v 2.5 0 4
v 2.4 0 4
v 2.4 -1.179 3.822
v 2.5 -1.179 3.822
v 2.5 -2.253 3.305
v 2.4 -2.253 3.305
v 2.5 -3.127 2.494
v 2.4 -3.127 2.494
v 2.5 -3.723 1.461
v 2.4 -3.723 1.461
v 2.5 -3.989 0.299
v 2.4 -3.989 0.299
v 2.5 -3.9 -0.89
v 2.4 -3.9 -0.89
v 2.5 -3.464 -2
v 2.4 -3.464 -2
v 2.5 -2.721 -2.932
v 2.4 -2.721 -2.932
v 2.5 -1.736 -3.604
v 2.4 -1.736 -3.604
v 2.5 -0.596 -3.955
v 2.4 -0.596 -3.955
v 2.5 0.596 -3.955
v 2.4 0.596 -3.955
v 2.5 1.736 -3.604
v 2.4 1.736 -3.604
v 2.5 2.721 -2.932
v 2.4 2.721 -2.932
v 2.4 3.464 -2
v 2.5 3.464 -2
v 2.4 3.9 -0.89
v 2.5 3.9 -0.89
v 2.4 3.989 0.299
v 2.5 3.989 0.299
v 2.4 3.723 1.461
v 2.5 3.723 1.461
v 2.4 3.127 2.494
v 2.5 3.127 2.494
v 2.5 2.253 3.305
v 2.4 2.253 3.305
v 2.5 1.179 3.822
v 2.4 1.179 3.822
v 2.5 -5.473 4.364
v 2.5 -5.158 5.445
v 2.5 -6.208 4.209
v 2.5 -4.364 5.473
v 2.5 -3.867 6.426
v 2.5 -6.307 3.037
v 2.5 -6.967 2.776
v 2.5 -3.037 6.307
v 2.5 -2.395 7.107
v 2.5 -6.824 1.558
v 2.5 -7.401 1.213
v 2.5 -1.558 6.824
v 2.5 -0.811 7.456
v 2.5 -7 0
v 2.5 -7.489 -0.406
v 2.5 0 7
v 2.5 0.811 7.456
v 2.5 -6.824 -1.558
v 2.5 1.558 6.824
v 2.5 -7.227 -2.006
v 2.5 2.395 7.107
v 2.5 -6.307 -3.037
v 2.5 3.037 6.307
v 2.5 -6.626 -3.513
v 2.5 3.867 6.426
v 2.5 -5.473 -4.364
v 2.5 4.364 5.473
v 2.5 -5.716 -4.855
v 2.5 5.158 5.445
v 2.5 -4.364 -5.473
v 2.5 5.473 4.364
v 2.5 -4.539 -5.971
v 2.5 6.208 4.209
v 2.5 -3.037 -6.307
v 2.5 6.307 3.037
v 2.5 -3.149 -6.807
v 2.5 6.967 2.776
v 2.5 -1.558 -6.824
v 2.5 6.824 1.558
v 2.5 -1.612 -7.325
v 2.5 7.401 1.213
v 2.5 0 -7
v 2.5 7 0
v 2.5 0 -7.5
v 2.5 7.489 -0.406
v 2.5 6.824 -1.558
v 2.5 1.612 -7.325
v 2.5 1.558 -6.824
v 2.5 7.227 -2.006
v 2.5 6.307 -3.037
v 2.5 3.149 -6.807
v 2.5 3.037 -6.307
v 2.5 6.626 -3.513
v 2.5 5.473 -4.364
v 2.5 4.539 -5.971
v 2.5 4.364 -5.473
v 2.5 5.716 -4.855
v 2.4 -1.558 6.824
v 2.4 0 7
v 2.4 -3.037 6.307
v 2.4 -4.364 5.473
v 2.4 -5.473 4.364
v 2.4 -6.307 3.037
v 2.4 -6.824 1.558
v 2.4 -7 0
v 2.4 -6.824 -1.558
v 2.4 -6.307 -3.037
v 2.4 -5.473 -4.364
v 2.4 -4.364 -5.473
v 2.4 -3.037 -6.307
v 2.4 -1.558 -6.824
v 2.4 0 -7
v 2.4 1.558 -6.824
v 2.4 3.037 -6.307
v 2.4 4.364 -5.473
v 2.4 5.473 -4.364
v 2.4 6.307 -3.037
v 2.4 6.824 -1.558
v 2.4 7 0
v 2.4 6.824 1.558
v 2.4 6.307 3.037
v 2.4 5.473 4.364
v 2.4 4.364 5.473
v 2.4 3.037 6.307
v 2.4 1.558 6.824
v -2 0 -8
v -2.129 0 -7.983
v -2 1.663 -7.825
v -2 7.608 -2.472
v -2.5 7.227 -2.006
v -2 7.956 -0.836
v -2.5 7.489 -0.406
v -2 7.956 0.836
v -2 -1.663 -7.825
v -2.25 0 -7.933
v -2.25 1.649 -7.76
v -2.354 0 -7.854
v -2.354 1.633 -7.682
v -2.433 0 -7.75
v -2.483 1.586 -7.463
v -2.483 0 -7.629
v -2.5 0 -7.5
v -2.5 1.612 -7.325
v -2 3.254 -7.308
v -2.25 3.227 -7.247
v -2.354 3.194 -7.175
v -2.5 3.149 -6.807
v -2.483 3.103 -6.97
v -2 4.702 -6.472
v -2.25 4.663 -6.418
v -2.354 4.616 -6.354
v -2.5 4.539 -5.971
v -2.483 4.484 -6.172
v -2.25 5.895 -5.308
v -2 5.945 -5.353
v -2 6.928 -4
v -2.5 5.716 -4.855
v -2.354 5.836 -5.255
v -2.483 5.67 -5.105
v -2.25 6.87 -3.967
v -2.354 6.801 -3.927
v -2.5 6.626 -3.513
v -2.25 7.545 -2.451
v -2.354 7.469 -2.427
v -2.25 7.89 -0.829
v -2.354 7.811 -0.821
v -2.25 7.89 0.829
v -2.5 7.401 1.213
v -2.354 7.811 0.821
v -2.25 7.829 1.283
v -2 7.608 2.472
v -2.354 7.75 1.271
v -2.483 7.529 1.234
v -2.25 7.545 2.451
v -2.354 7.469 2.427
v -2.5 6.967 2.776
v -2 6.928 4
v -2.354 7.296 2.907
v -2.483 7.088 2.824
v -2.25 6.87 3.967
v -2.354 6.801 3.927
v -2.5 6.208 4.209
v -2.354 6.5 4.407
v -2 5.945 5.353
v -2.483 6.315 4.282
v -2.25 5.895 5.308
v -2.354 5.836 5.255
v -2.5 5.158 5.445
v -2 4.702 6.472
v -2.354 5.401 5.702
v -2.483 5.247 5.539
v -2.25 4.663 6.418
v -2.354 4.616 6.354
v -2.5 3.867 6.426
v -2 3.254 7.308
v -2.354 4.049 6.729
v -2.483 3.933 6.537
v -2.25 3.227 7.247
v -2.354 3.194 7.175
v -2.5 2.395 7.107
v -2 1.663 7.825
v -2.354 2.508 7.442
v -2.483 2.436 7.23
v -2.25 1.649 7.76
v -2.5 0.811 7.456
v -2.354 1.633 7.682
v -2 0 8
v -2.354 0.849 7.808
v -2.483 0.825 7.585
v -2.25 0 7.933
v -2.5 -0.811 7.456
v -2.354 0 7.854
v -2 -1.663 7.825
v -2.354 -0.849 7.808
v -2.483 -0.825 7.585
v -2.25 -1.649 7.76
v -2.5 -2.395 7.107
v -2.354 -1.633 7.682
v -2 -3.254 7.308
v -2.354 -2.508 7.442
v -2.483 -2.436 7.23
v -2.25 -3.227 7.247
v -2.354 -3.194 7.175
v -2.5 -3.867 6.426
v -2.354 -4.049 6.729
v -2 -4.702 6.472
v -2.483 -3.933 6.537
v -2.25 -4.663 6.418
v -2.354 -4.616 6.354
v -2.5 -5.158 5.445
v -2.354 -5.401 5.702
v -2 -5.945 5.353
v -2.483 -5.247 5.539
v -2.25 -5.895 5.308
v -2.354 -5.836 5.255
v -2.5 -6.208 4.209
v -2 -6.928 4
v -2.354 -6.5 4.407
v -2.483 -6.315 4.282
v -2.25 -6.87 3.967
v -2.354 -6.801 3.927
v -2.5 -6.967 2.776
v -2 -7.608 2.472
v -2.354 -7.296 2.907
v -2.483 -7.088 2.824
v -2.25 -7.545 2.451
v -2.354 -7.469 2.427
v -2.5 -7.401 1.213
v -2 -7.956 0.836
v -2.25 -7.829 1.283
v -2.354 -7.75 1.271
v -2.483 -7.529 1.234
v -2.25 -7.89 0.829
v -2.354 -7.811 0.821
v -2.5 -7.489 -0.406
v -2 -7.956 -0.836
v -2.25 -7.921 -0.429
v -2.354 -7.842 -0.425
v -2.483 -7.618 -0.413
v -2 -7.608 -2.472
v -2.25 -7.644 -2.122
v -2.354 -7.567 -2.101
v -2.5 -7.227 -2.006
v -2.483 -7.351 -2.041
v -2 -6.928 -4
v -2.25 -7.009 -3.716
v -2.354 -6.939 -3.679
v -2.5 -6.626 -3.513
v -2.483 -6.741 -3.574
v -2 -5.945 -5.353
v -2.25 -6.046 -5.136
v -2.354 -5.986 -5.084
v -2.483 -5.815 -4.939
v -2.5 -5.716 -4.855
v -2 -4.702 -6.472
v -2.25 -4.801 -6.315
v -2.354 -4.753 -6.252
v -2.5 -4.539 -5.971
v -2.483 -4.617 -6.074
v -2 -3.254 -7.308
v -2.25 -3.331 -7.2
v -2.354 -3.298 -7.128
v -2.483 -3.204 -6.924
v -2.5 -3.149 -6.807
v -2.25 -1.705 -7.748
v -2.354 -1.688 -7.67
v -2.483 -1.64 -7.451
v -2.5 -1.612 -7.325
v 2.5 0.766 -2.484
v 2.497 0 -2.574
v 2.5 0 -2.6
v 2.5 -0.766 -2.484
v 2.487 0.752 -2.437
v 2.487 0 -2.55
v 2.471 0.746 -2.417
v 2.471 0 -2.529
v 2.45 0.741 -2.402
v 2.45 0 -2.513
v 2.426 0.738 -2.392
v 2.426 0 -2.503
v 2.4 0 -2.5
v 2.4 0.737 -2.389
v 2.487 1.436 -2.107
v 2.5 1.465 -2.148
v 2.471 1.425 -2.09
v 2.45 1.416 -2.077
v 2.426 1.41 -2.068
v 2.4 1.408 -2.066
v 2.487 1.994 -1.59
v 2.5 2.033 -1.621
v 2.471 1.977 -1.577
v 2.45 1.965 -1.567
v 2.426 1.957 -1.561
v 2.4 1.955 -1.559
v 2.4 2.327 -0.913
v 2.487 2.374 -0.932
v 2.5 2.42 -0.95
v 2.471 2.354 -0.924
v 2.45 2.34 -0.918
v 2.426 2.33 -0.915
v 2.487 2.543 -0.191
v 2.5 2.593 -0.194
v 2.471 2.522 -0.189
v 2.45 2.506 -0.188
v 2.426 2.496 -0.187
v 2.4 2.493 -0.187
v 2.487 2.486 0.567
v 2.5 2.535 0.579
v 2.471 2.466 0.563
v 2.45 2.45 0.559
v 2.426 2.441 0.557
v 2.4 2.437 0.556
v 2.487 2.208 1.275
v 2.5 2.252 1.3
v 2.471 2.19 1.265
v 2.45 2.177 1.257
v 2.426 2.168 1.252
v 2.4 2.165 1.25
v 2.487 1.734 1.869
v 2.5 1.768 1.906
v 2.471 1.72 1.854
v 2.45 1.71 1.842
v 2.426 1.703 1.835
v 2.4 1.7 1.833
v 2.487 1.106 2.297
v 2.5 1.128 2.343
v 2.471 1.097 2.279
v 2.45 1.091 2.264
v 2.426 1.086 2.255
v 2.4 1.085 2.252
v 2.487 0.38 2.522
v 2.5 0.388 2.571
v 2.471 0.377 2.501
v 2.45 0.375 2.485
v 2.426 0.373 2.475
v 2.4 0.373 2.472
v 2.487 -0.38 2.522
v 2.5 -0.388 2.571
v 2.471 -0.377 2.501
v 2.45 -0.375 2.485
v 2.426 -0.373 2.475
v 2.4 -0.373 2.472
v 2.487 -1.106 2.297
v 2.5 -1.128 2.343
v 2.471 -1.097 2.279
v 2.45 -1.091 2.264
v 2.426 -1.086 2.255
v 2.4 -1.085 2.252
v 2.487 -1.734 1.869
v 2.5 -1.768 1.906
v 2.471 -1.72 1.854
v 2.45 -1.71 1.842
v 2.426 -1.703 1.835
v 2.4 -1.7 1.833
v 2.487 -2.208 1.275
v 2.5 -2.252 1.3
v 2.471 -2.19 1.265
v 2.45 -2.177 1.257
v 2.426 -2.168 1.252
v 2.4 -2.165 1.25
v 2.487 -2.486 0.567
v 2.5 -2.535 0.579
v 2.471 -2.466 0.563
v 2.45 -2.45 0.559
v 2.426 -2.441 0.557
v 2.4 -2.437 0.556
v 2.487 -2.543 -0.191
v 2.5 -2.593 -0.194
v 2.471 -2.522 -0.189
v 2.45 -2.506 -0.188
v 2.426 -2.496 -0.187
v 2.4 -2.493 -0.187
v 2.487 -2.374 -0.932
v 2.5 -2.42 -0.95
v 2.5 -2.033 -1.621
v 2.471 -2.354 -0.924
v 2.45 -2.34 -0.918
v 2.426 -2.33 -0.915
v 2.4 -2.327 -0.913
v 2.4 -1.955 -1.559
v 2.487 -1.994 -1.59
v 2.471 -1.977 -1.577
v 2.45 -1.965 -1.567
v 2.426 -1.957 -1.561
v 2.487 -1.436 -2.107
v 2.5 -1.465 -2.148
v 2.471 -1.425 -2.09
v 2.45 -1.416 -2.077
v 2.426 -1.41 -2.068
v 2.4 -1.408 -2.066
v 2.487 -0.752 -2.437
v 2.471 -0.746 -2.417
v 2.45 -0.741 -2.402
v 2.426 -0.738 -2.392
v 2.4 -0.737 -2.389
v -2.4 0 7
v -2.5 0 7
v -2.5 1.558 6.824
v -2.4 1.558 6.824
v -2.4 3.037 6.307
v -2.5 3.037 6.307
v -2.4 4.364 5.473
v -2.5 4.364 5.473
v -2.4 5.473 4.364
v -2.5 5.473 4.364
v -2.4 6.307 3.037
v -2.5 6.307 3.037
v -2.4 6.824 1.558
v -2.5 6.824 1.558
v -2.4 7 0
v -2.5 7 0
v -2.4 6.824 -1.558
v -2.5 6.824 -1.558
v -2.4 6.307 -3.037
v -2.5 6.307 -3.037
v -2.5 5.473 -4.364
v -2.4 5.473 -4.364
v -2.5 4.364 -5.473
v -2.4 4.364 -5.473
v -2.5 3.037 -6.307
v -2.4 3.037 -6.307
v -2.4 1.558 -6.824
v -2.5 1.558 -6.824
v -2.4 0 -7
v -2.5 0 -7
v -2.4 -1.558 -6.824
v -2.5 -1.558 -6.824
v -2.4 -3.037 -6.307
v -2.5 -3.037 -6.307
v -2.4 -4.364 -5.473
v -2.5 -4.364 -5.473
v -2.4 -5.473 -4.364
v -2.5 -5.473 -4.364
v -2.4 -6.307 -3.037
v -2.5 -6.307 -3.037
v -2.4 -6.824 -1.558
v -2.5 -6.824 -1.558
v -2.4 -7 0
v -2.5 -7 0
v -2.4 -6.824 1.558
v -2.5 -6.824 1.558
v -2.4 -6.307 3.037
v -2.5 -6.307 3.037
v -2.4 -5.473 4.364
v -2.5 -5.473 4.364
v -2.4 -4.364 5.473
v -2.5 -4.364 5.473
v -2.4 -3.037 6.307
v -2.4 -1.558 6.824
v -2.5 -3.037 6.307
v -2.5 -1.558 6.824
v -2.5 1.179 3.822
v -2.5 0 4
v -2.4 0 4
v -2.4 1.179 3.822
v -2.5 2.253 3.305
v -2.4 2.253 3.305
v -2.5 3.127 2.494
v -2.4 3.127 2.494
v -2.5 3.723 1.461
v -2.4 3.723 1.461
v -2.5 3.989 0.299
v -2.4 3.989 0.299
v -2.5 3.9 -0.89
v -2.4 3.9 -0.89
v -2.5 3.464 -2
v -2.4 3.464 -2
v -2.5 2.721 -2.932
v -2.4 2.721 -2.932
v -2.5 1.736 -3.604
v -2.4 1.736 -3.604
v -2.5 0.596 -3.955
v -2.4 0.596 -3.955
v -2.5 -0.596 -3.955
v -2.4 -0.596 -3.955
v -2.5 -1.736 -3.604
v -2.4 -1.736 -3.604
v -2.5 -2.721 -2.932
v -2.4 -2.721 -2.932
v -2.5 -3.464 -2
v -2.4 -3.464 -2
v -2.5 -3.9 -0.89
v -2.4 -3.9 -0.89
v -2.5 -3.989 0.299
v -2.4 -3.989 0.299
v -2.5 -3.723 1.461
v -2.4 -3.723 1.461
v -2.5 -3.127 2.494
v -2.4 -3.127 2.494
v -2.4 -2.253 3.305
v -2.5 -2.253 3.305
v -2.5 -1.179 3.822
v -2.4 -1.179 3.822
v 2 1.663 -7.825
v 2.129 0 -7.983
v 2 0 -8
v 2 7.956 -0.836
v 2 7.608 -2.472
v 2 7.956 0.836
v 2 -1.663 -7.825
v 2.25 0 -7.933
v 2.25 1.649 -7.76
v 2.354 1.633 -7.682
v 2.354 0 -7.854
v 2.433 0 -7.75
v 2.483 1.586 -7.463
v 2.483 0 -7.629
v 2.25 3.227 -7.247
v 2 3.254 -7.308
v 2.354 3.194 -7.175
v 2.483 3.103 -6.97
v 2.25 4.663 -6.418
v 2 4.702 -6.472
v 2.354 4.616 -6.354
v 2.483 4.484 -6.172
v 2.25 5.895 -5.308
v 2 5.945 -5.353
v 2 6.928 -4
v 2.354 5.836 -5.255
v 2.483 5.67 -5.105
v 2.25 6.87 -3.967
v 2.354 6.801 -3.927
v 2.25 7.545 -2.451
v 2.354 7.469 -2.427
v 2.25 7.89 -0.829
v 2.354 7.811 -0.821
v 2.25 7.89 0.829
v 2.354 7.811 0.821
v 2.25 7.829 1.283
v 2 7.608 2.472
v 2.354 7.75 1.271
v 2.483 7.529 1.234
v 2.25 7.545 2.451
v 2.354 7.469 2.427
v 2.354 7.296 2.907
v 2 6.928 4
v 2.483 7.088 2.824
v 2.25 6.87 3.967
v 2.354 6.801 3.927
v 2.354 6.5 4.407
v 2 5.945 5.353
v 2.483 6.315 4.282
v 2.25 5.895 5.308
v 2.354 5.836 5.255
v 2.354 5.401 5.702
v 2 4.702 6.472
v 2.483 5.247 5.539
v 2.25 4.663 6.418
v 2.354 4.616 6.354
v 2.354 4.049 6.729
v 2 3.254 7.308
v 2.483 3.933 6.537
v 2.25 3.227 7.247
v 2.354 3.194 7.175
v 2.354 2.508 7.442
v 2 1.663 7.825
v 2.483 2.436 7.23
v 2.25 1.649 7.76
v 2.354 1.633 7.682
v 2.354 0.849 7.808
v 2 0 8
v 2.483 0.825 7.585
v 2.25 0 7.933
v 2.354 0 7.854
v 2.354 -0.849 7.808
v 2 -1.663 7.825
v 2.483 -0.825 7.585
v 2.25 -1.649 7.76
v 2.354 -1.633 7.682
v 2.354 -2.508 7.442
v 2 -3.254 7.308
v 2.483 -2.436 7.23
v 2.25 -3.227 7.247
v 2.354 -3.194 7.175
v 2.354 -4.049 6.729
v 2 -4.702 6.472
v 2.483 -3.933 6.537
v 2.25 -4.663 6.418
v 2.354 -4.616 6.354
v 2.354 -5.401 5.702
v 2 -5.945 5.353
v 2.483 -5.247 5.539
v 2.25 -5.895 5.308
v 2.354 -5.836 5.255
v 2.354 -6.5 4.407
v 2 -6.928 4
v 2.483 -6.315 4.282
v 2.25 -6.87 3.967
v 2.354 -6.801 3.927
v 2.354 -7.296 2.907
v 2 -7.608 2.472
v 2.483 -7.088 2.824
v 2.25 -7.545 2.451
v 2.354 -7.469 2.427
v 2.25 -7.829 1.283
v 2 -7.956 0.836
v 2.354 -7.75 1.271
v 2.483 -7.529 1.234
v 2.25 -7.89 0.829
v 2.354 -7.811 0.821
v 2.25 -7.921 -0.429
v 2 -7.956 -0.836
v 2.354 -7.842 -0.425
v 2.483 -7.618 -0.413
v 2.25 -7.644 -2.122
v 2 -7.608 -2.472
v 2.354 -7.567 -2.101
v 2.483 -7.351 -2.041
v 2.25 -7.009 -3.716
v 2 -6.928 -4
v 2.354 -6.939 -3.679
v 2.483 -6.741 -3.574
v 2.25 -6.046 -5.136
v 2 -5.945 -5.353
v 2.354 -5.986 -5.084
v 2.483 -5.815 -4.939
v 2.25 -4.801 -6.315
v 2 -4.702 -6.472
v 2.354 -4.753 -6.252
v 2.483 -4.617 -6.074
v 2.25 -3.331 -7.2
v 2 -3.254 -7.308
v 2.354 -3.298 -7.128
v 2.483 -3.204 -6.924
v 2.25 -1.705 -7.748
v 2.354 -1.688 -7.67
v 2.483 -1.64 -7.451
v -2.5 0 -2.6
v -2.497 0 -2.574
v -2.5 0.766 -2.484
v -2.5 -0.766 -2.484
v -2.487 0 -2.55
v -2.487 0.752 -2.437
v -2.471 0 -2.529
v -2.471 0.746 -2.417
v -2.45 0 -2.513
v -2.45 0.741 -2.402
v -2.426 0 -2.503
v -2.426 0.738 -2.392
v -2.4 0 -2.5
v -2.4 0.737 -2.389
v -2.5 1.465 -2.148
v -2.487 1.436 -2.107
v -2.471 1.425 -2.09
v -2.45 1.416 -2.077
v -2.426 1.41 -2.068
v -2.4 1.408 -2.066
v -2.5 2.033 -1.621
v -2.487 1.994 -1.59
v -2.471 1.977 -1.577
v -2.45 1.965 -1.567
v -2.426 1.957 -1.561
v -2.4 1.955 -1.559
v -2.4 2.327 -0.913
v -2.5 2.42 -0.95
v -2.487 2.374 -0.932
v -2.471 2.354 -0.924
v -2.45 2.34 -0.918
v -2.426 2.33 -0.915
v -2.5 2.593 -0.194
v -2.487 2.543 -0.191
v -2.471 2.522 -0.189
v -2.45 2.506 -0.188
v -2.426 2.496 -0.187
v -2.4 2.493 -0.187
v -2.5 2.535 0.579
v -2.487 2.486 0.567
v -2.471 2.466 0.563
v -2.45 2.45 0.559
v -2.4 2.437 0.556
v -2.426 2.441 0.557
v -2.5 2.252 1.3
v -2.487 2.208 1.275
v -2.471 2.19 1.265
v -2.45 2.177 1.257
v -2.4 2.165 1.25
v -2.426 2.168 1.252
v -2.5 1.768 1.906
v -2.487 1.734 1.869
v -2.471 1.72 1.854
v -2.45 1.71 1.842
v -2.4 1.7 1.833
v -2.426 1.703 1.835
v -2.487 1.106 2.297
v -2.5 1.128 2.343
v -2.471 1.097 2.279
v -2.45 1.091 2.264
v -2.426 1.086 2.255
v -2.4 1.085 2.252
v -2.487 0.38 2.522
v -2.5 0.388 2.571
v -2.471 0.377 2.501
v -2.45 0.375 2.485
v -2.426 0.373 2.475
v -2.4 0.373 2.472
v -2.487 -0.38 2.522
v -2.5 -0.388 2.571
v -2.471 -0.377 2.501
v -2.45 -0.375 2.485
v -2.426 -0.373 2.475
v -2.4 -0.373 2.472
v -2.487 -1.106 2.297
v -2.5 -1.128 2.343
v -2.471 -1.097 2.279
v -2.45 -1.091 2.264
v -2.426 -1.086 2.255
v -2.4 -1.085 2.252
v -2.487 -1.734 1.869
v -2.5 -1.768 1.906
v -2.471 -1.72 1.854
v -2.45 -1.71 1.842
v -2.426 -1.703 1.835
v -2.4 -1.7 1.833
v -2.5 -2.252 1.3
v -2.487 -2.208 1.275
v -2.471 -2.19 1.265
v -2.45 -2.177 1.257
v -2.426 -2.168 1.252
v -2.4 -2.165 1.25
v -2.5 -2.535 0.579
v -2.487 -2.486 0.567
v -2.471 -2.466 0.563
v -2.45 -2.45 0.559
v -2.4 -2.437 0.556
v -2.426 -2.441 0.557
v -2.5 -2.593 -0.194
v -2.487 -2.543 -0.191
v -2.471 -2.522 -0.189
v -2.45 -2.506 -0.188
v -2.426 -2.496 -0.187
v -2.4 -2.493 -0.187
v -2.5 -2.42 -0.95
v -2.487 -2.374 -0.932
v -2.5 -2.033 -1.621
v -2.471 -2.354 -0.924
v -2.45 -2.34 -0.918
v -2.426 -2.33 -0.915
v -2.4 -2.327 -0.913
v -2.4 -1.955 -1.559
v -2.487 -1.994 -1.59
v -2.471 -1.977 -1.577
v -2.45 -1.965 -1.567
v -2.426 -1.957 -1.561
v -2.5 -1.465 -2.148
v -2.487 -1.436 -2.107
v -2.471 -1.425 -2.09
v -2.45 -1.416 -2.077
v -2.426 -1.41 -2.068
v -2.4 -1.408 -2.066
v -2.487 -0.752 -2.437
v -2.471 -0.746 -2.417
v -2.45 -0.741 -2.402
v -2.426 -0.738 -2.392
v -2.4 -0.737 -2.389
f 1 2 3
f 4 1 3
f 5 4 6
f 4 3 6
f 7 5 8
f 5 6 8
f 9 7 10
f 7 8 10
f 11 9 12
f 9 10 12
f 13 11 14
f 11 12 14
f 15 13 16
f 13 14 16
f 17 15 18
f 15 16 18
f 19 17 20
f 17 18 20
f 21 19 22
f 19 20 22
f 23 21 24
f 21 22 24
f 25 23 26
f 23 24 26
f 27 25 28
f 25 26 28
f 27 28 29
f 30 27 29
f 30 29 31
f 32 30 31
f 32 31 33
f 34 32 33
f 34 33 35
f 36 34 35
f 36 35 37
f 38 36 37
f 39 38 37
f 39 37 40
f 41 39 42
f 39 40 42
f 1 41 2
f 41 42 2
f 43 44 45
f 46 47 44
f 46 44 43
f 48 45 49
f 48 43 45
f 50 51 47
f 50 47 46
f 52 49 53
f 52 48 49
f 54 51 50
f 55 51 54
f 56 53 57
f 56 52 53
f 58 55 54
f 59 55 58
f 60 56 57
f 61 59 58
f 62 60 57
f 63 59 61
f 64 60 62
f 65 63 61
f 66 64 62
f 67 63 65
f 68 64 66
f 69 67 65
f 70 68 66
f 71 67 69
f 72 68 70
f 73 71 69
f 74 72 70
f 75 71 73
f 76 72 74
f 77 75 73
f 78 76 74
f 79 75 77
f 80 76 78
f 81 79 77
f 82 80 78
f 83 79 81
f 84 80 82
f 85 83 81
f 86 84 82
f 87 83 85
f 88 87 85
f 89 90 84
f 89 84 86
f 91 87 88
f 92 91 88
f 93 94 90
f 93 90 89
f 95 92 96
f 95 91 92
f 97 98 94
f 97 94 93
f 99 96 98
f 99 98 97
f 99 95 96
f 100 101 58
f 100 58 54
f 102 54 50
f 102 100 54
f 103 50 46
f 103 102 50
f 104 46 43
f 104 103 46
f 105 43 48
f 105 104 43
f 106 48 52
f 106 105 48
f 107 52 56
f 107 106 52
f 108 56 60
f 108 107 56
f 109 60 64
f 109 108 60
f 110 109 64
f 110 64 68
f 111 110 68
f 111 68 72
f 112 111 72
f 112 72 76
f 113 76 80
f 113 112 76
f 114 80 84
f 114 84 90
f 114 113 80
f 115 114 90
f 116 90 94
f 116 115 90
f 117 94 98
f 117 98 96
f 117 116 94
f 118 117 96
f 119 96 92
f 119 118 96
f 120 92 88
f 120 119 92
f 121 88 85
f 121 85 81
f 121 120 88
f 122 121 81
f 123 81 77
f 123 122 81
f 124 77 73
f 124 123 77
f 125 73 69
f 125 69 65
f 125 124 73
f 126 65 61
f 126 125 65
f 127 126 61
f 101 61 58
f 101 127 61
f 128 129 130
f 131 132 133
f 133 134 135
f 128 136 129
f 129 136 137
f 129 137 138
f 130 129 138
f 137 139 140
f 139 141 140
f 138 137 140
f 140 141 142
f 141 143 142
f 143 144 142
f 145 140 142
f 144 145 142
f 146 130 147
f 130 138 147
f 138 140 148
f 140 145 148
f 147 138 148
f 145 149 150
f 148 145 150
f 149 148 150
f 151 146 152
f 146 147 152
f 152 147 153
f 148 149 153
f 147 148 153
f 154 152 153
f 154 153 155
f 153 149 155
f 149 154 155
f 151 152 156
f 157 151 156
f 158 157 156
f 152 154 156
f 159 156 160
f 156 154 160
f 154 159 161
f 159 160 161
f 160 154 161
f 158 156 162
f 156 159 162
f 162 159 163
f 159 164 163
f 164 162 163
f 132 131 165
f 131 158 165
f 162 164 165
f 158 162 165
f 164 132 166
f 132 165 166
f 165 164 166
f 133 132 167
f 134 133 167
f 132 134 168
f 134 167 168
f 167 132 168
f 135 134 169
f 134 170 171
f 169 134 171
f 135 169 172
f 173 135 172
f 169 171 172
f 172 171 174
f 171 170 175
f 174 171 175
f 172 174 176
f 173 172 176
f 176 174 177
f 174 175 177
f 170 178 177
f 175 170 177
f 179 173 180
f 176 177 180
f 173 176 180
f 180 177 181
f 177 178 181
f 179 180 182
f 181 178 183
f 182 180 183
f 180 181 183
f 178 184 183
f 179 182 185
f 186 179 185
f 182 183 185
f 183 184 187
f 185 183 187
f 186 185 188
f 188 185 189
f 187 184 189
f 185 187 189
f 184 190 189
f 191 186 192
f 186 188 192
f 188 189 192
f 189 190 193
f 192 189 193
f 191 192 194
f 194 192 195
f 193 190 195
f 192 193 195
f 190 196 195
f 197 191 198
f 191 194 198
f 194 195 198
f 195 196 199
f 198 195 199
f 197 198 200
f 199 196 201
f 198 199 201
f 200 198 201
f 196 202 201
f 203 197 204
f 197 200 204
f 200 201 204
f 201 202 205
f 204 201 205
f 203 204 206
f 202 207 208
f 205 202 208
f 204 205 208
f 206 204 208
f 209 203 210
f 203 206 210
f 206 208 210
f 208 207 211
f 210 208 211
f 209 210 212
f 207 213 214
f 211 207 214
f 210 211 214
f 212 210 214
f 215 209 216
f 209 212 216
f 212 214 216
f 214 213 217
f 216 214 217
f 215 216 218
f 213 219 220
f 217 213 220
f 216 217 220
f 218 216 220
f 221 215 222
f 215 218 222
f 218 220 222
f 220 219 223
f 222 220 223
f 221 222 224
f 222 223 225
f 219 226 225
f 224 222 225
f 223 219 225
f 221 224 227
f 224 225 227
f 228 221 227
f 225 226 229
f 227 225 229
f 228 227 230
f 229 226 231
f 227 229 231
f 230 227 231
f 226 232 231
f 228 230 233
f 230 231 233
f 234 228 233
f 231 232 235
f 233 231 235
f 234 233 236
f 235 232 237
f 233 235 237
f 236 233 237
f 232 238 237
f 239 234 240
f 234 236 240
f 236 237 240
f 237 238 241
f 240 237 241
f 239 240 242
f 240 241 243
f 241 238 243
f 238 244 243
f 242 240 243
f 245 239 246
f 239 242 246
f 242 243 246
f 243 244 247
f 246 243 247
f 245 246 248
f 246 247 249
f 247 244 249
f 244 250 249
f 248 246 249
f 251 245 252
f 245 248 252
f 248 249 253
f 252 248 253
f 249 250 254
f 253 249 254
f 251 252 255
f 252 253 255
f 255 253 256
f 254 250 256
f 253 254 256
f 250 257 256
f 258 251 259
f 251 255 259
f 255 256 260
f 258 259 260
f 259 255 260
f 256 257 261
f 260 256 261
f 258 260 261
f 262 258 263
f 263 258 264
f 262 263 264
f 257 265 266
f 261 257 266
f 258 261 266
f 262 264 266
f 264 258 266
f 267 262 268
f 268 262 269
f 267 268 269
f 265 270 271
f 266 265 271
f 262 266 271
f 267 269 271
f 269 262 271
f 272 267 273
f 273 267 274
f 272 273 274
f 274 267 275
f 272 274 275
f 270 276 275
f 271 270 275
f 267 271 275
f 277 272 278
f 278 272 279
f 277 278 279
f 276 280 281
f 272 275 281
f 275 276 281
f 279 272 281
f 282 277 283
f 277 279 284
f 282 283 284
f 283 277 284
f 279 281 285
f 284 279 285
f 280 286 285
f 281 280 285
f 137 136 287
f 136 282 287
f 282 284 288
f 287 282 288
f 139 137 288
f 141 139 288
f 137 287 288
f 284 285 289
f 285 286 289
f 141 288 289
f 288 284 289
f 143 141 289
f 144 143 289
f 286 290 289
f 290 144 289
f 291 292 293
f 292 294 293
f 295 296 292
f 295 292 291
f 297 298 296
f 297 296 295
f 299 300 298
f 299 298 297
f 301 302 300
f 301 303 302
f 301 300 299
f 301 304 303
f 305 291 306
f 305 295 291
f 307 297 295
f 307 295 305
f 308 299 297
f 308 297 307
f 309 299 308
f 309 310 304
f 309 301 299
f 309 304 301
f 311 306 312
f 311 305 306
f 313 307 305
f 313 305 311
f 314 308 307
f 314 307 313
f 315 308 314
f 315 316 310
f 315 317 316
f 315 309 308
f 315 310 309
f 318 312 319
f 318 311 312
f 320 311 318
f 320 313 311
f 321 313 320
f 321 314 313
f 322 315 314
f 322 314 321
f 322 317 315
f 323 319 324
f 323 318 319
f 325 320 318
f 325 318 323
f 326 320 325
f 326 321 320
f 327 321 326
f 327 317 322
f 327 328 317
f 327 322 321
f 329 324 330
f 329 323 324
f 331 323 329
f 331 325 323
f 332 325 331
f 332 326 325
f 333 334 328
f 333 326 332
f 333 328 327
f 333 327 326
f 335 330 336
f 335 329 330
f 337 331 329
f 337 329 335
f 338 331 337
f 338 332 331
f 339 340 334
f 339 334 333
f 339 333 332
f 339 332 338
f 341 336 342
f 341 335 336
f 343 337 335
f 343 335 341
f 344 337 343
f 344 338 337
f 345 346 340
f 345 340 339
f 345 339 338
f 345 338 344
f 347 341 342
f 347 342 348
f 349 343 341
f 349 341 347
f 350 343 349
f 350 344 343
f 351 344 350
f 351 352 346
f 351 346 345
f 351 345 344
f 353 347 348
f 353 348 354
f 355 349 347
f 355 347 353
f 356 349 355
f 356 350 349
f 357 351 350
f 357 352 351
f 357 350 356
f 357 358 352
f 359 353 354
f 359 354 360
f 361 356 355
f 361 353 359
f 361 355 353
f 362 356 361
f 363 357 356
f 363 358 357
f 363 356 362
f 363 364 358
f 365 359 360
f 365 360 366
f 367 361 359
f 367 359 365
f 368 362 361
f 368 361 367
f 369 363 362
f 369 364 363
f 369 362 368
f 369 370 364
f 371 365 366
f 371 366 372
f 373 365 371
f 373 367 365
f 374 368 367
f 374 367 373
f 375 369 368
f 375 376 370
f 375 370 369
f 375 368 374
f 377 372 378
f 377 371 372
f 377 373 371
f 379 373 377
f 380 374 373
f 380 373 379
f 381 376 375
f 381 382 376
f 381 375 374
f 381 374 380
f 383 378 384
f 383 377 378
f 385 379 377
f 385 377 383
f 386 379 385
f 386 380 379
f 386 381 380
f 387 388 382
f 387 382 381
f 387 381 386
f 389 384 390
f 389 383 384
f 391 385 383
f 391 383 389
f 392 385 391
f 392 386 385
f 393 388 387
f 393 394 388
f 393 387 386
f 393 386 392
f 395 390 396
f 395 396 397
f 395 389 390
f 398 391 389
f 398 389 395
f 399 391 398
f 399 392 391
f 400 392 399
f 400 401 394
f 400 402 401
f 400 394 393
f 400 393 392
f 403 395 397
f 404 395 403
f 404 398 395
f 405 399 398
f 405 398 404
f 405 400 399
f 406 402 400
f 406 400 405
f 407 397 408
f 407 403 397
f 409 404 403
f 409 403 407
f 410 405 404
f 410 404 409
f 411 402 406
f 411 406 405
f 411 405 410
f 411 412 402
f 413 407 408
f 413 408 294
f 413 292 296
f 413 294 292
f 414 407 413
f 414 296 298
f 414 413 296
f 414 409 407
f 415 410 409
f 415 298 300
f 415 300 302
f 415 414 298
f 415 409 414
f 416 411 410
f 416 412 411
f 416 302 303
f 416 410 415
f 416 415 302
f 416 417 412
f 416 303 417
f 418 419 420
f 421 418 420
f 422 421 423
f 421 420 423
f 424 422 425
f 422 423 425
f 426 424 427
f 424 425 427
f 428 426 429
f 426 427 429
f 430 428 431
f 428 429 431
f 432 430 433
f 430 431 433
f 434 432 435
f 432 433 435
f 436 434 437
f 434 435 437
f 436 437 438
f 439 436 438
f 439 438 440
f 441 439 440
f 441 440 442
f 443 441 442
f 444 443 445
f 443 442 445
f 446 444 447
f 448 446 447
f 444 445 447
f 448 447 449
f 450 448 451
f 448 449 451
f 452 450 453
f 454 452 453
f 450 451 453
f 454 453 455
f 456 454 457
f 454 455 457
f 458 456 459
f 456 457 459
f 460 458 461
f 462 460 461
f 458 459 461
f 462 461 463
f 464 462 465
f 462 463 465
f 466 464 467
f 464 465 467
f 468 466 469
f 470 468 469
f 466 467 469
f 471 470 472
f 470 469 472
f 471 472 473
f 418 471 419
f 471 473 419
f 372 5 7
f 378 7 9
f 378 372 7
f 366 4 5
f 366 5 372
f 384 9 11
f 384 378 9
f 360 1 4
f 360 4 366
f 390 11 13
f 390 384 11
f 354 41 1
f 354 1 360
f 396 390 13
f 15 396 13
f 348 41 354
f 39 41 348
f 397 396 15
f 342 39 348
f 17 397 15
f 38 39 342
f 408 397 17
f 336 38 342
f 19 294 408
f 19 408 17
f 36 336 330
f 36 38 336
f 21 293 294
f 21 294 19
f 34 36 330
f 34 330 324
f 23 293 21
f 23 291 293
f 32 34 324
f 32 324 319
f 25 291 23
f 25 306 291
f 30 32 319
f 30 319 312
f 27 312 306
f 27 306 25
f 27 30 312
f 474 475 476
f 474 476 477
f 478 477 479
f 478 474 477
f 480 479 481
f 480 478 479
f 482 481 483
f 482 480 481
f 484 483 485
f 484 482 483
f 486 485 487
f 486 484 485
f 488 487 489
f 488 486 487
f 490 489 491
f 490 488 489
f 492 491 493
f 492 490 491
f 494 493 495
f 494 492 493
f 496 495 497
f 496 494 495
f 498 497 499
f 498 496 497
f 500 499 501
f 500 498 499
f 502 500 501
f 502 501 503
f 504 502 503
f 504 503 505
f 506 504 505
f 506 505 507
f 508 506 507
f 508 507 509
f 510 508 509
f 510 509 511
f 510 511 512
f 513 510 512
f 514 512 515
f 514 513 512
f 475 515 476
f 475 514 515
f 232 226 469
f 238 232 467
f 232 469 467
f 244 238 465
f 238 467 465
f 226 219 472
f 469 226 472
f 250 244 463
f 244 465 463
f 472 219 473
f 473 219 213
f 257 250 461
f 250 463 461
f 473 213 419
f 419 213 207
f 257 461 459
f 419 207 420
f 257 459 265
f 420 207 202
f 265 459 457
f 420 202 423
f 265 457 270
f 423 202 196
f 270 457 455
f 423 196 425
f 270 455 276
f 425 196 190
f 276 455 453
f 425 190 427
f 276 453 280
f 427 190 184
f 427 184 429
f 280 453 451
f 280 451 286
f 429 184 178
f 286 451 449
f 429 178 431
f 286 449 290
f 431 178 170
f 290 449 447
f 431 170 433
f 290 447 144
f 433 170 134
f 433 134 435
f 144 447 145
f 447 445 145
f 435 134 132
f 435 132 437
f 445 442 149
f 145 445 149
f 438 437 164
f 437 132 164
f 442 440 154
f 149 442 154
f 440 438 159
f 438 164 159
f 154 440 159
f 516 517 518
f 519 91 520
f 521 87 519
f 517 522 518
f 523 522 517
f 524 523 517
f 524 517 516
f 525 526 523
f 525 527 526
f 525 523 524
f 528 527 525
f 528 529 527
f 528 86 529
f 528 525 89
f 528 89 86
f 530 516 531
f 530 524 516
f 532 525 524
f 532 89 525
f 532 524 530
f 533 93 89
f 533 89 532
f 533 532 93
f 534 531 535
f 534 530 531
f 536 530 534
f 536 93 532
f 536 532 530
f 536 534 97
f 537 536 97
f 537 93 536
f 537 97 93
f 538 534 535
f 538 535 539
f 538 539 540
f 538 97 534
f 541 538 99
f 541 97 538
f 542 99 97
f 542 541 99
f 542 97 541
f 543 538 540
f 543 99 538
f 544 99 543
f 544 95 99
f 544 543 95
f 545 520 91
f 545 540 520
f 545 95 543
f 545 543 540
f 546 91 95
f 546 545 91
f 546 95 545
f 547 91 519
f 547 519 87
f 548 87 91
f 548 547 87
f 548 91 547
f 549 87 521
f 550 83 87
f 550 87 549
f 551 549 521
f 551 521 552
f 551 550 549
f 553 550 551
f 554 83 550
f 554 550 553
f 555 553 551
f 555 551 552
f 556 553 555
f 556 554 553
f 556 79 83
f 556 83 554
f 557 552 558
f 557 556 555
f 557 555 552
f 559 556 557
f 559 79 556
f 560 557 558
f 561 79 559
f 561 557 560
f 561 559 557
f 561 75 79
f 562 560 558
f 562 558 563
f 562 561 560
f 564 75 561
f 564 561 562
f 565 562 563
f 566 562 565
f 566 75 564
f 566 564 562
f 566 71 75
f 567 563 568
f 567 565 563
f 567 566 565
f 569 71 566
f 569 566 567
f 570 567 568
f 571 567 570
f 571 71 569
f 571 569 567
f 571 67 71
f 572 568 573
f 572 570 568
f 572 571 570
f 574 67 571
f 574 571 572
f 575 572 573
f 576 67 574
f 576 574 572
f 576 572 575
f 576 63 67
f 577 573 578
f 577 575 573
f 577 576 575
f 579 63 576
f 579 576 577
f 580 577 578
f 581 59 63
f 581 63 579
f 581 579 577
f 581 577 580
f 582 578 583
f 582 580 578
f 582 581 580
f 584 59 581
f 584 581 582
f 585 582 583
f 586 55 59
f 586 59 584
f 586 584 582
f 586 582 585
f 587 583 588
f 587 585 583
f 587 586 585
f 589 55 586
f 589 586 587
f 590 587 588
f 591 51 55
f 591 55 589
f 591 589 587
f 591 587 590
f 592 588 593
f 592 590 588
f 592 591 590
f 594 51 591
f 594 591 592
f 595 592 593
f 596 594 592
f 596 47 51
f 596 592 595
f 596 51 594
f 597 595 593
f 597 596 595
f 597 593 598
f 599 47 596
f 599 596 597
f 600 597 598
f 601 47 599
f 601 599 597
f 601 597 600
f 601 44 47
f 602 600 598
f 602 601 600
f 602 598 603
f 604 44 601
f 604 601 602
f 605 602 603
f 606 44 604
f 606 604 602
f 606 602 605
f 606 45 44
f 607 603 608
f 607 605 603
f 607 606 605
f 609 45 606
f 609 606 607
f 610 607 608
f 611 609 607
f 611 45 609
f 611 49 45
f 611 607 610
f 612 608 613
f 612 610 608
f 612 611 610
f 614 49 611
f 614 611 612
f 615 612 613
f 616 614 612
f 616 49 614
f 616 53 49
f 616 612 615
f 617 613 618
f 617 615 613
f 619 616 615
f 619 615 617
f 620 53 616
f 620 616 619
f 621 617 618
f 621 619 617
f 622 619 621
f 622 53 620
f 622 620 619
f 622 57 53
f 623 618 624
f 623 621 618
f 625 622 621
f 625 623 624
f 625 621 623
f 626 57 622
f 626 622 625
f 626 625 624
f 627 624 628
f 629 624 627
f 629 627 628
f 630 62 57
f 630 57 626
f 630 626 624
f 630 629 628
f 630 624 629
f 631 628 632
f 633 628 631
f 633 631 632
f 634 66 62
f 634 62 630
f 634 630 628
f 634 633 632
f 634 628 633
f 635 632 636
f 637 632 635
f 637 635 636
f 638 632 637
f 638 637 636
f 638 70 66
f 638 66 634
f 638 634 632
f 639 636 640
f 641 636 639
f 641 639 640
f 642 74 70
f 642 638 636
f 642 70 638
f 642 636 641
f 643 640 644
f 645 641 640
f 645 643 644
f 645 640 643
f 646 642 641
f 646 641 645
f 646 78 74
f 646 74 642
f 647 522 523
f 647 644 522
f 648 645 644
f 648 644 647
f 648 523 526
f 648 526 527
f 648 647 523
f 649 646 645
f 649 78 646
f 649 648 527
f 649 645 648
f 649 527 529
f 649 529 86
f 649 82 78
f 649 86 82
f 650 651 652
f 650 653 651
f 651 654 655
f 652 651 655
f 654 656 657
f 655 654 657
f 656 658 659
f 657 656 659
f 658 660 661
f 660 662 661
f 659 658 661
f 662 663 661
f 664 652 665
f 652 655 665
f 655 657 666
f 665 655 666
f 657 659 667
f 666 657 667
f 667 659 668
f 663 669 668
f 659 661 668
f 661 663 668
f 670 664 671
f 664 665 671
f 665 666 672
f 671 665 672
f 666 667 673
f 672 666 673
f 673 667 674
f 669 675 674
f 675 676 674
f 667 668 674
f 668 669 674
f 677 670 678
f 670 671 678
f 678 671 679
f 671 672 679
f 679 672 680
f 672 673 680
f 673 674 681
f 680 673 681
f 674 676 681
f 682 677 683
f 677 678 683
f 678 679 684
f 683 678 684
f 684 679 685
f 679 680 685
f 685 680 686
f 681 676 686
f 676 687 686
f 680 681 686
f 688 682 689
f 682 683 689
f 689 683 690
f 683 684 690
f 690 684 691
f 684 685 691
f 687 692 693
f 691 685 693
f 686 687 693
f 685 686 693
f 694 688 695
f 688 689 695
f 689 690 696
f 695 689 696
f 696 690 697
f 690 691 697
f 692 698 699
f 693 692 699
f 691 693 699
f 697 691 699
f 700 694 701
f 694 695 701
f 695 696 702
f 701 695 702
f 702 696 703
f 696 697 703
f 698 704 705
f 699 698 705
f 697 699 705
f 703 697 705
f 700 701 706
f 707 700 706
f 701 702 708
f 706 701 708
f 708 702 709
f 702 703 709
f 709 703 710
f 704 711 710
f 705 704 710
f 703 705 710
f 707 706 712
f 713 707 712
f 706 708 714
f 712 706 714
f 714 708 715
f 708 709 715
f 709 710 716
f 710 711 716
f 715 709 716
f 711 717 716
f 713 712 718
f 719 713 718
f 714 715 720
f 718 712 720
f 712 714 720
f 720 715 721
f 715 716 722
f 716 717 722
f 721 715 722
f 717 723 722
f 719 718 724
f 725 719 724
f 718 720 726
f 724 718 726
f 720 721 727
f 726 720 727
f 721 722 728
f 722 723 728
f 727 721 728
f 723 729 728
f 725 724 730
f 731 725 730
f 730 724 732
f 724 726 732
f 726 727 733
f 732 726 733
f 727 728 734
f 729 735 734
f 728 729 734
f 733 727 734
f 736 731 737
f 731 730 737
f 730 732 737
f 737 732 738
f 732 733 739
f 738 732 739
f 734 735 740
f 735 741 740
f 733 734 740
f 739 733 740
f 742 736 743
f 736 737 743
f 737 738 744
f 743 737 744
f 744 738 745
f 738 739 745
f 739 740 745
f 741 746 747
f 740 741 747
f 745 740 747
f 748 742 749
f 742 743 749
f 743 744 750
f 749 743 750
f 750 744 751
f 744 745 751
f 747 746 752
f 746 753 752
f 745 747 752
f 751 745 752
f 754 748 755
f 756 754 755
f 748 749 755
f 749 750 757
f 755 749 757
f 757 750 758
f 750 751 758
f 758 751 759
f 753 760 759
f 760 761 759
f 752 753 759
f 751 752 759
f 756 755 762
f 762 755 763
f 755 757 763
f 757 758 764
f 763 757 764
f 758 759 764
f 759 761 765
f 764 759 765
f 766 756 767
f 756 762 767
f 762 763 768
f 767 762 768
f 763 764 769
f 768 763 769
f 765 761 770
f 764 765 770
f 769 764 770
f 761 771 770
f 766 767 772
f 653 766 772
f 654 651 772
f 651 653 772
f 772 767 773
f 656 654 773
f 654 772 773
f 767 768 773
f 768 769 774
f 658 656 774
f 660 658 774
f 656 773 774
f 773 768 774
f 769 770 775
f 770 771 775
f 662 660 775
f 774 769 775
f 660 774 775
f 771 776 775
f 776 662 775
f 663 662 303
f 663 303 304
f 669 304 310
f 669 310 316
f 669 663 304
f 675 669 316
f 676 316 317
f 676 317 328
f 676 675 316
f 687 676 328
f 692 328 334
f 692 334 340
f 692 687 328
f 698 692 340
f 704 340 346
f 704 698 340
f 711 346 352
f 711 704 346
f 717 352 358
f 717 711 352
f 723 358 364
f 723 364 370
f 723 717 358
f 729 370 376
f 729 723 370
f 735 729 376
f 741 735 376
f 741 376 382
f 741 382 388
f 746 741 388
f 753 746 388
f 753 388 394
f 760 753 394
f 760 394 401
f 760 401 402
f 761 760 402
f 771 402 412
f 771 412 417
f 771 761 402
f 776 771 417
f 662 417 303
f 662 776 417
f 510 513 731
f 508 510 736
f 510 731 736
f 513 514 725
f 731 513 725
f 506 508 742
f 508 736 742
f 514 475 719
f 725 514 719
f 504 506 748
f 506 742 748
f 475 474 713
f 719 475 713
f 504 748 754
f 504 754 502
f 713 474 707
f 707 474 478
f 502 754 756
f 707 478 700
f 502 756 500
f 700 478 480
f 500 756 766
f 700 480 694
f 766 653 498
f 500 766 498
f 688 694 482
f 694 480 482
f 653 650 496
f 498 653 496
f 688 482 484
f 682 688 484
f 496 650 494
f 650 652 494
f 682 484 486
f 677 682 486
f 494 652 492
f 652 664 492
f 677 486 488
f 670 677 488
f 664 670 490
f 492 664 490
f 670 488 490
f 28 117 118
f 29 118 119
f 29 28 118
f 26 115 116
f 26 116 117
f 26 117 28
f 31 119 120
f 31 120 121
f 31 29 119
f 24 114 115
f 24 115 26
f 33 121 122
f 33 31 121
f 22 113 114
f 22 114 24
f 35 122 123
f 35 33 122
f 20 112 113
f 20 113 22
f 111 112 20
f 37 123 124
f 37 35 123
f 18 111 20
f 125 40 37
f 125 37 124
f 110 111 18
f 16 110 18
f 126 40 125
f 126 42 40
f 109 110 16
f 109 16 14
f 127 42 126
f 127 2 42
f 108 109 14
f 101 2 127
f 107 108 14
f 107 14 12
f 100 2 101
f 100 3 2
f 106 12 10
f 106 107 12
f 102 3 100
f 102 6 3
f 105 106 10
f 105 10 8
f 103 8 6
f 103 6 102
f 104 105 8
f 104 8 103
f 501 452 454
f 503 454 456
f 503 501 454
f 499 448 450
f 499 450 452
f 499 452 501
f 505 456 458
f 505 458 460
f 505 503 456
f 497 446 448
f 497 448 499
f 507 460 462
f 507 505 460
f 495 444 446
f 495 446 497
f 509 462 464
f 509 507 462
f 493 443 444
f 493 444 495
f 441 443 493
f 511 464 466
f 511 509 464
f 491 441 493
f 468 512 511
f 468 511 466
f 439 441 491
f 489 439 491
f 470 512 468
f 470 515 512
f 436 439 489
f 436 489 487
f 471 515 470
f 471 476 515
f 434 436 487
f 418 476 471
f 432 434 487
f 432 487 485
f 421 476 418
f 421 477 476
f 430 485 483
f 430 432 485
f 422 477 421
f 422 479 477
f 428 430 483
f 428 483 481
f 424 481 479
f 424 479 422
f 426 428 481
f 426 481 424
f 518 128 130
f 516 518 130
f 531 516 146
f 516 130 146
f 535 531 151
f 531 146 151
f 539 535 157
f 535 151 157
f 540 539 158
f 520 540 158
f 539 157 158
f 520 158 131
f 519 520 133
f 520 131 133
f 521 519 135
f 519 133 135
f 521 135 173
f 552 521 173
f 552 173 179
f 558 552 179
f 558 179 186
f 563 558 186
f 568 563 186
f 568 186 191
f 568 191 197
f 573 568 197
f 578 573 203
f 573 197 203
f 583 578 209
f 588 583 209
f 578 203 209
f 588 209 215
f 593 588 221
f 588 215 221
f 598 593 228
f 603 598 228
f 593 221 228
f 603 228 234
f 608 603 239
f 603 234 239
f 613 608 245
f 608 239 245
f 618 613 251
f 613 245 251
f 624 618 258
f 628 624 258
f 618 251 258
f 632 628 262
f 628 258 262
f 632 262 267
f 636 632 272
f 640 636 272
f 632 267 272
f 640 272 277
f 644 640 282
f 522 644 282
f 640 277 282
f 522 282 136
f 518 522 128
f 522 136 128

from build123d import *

# Parameters (mm, degrees)
SALIENTE_EXTRUIR2_DEPTH      = 2.5
SALIENTE_EXTRUIR2_DEPTH_BACK = 2.5
CROQUIS2_R                   = 8
CROQUIS2_R_2                 = 2.5
REDONDEO1_R                  = 0.5
REDONDEO2_R                  = 0.1
CROQUIS3_R                   = 7
CROQUIS3_R_2                 = 4
CORTAR_EXTRUIR1_DEPTH        = 0.1
CORTAR_EXTRUIR2_START        = -0.1
CROQUIS4_R                   = 7
CROQUIS4_R_2                 = 4
CORTAR_EXTRUIR2_DEPTH        = 0.1


with BuildPart() as part:
    # Croquis2 → Saliente-Extruir2 (new, two sides: drawn at the far end of the back side and taken through both)
    with BuildSketch(Plane(origin=(0, 0, 0), x_dir=(0, 0, -1), z_dir=(1, 0, 0)).offset(-SALIENTE_EXTRUIR2_DEPTH_BACK)):
        Circle(CROQUIS2_R)
        Circle(CROQUIS2_R_2, mode=Mode.SUBTRACT)
    extrude(amount=SALIENTE_EXTRUIR2_DEPTH + SALIENTE_EXTRUIR2_DEPTH_BACK)

    # Redondeo1
    redondeo1_edges = [part.edges().sort_by_distance(p)[0] for p in [
        (-2.5, 0, 8),
        (2.5, 0, 8),
    ]]
    fillet(redondeo1_edges, radius=REDONDEO1_R)

    # Redondeo2
    redondeo2_edges = [part.edges().sort_by_distance(p)[0] for p in [
        (-2.5, 0, 2.5),
        (2.5, 0, 2.5),
    ]]
    fillet(redondeo2_edges, radius=REDONDEO2_R)

    # Croquis3 → Cortar-Extruir1 (cut)
    with BuildSketch(Plane.ZY.offset(2.5)):
        Circle(CROQUIS3_R)
        Circle(CROQUIS3_R_2, mode=Mode.SUBTRACT)
    extrude(amount=-CORTAR_EXTRUIR1_DEPTH, mode=Mode.SUBTRACT)

    # Croquis4 → Cortar-Extruir2 (cut)
    with BuildSketch(Plane(origin=(2.5, 0, 0), x_dir=(0, 0, -1), z_dir=(1, 0, 0)).offset(CORTAR_EXTRUIR2_START)):
        with Locations(Location((0, 0, 0), (0, 0, 180))):
            Circle(CROQUIS4_R)
        with Locations(Location((0, 0, 0), (0, 0, 180))):
            Circle(CROQUIS4_R_2, mode=Mode.SUBTRACT)
    extrude(amount=CORTAR_EXTRUIR2_DEPTH, mode=Mode.SUBTRACT)


solid = part.part
